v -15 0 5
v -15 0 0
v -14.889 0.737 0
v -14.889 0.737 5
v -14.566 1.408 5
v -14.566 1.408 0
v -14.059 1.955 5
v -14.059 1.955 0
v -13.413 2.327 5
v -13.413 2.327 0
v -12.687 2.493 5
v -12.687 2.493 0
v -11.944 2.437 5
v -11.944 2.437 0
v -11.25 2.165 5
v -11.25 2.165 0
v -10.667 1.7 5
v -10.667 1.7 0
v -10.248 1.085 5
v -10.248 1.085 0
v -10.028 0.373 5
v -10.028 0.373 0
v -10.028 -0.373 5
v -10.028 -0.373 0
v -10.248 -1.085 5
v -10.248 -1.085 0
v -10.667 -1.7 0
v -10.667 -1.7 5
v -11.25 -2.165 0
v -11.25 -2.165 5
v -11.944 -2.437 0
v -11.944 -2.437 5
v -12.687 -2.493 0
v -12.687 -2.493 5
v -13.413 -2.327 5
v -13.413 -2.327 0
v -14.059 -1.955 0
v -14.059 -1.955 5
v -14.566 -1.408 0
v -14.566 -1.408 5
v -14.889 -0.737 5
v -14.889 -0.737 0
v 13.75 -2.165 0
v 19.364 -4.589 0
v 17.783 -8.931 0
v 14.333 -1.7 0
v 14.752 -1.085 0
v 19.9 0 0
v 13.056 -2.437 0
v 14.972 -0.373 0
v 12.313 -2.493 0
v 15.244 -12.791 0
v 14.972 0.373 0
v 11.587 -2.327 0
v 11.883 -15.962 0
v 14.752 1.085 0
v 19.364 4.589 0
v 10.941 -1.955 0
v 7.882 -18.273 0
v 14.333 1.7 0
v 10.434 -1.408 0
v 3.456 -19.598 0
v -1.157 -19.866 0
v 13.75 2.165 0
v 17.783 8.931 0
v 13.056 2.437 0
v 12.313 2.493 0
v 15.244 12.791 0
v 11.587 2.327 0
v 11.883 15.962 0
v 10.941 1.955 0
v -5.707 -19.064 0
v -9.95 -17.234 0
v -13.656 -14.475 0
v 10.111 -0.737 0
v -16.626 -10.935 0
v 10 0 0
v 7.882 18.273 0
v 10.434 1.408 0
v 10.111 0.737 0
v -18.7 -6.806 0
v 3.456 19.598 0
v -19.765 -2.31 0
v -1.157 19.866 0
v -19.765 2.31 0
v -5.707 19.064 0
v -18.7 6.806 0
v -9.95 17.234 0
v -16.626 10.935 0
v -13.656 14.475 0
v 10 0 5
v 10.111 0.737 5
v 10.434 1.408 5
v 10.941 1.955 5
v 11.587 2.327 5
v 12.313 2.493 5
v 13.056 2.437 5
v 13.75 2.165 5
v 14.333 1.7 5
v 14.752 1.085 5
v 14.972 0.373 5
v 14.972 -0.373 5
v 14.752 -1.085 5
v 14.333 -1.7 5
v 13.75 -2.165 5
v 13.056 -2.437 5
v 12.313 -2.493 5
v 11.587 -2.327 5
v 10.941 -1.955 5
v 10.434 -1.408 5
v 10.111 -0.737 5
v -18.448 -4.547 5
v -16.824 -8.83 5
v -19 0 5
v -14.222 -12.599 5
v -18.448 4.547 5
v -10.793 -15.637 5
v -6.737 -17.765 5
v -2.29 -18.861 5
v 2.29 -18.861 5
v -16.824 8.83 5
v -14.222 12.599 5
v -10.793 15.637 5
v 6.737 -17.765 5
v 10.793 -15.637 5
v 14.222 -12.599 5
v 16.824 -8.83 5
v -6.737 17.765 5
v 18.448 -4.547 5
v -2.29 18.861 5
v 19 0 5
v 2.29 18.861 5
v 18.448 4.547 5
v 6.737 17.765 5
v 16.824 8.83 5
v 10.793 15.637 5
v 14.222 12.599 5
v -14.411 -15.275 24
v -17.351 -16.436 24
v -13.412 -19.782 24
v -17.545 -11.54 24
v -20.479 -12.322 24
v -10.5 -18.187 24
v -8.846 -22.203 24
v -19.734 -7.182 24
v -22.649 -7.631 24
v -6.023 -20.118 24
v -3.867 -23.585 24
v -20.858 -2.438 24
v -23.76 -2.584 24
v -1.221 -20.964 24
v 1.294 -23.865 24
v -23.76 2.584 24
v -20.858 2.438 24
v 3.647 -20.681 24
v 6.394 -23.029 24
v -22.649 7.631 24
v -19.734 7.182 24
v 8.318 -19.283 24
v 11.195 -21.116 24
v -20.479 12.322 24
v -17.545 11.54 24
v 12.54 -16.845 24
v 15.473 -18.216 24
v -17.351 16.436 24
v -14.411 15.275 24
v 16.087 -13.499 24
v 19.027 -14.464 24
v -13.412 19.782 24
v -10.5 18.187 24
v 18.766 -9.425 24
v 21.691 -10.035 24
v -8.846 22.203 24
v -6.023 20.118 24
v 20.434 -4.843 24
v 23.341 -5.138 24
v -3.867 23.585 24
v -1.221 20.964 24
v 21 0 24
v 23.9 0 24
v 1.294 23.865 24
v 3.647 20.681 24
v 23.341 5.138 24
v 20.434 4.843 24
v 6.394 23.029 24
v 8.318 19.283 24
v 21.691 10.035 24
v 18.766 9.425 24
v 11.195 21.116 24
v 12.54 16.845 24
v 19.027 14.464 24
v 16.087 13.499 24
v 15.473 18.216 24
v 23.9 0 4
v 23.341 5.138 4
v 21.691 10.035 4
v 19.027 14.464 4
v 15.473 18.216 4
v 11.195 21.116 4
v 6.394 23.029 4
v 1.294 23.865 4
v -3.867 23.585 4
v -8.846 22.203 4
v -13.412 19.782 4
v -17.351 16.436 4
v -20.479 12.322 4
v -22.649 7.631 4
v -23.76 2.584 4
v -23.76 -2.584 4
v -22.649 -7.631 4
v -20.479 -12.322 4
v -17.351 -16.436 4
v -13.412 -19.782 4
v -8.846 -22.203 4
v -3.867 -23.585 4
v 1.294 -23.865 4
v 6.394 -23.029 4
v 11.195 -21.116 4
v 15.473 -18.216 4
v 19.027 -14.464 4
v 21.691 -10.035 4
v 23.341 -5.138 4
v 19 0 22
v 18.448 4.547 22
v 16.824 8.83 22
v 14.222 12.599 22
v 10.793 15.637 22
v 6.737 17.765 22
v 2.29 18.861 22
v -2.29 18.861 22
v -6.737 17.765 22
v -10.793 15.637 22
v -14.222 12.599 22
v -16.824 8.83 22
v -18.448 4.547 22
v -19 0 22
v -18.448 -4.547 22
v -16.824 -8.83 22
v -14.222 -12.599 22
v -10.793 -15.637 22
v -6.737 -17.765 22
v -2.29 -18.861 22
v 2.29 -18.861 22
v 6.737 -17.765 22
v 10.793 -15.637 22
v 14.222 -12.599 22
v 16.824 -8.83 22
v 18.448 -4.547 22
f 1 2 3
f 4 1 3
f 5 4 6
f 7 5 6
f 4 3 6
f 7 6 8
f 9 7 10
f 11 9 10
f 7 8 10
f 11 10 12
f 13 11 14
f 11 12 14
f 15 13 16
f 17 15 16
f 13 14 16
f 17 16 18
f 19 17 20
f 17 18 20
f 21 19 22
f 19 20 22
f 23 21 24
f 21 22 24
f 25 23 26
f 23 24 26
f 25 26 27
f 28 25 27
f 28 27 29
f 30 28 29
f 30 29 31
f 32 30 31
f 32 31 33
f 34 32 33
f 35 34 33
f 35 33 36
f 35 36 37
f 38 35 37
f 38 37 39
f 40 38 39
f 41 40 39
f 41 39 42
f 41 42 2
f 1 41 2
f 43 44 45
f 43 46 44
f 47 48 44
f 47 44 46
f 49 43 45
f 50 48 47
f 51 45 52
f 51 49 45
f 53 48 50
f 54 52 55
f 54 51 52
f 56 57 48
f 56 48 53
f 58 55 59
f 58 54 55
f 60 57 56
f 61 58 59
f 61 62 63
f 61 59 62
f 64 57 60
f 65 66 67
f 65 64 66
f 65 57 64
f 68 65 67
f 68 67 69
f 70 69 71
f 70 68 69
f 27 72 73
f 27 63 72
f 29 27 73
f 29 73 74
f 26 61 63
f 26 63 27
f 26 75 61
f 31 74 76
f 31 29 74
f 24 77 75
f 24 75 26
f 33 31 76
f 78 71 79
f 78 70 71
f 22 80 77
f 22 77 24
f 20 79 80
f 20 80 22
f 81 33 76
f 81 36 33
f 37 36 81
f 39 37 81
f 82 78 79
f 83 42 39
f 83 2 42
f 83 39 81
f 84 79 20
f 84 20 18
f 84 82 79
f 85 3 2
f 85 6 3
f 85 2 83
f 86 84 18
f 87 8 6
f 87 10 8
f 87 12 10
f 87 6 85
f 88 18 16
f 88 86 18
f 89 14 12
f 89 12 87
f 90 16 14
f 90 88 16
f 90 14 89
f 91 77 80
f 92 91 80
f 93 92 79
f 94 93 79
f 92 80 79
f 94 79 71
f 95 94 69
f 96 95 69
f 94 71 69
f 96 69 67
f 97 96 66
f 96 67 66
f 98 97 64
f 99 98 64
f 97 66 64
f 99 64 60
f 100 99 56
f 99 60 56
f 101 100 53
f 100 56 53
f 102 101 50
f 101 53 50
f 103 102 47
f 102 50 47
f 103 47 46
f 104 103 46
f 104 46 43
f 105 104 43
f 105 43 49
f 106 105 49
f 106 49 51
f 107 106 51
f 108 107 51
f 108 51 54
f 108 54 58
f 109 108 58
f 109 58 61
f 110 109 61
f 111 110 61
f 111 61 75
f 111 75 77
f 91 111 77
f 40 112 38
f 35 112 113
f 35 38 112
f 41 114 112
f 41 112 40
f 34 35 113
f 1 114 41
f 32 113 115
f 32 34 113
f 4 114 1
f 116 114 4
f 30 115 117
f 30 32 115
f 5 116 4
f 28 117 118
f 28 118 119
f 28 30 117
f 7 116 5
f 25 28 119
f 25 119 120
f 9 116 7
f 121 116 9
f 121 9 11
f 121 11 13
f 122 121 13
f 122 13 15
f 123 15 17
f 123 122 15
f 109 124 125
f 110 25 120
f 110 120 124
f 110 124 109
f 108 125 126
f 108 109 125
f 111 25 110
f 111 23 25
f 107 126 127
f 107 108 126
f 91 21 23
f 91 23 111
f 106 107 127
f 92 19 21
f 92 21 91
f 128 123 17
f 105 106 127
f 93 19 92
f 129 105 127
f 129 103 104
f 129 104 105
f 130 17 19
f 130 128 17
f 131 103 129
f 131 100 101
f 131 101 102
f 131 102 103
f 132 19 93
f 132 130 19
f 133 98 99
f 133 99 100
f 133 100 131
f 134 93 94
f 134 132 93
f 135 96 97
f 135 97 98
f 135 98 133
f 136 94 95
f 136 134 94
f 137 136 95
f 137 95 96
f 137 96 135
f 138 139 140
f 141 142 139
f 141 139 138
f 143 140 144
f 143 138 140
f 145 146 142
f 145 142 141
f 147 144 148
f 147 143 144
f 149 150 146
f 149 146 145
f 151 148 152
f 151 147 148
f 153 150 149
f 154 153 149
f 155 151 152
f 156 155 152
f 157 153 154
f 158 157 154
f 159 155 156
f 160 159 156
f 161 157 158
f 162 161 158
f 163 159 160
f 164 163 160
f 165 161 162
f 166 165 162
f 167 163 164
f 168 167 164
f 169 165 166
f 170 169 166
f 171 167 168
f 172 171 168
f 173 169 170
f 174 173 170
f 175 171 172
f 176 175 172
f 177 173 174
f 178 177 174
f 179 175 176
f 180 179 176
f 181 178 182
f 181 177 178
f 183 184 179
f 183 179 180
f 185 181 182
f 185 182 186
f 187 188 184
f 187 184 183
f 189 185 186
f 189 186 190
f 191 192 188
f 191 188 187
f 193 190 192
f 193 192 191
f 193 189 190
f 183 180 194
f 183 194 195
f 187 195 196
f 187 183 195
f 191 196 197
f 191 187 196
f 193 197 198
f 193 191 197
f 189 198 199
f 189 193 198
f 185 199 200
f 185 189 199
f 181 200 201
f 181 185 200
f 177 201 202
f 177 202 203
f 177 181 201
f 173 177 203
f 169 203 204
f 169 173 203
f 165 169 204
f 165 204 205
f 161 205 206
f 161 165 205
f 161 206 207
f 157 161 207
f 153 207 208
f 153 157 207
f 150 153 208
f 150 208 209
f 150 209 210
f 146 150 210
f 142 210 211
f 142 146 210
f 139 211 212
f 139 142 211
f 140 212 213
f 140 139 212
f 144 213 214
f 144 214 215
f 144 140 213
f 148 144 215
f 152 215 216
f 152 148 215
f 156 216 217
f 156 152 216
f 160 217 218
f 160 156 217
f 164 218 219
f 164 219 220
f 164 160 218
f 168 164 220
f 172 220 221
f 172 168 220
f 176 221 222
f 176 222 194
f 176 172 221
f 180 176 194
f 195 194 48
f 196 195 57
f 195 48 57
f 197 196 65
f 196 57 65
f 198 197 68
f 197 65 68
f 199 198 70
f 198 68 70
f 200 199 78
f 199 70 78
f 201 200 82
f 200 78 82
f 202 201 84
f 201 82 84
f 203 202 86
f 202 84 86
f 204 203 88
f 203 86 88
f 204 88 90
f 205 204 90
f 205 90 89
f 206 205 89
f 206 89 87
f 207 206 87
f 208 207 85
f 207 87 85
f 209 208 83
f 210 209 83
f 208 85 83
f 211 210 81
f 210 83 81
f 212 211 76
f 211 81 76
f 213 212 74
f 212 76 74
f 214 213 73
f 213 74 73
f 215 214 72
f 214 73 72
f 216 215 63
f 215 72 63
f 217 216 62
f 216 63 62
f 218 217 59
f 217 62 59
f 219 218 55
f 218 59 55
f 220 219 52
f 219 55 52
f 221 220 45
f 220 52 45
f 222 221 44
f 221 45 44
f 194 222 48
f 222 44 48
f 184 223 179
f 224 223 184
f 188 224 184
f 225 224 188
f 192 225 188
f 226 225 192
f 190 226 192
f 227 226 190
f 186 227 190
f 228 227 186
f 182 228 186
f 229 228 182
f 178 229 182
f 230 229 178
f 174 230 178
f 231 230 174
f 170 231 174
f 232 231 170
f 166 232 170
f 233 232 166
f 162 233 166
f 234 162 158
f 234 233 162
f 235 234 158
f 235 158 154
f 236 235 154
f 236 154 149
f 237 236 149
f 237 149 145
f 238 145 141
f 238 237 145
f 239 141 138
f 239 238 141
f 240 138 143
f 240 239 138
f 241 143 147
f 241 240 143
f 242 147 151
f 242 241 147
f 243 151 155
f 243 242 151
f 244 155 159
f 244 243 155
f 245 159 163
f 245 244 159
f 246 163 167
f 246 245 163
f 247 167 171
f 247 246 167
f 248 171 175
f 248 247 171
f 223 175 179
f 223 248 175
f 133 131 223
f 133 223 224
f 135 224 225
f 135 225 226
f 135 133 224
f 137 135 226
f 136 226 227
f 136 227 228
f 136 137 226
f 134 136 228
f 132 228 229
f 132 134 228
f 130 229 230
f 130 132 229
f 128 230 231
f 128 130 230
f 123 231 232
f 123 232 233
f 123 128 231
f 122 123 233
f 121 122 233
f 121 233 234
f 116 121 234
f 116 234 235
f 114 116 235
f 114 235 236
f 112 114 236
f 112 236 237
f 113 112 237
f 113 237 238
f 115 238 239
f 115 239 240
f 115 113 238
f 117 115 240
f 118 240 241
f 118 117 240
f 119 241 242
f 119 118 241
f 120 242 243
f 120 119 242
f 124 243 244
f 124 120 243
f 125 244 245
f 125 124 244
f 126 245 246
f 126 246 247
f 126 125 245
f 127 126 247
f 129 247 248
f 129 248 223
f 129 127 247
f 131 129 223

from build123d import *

# Parameters (mm, degrees)
F2_SIZE = 2
F3_SIZE = 4
F5_D    = 5


with BuildPart() as f1:
    # F0 (on Front) → F1 (revolve)
    with BuildSketch(Plane.XZ):
        Polygon((0, 5), (0, 0), (23.9, 0), (23.9, 24), (19, 24), (19, 5), align=None)
    revolve(axis=Axis((0, 0, 12.3709159863), (0, 0, 1)))

    # F2
    f2_edges = [f1.edges().sort_by_distance(p)[0] for p in [
        (-19, 0, 24),
    ]]
    chamfer(f2_edges, length=F2_SIZE)

    # F3
    f3_edges = [f1.edges().sort_by_distance(p)[0] for p in [
        (-23.9, 0, 0),
    ]]
    chamfer(f3_edges, length=F3_SIZE)

    # F5 (through all)
    with Locations(Plane.XY.offset(5)):
        with Locations((-12.5, 0), (12.5, 0)):
            Hole(F5_D / 2)


solid = f1.part
